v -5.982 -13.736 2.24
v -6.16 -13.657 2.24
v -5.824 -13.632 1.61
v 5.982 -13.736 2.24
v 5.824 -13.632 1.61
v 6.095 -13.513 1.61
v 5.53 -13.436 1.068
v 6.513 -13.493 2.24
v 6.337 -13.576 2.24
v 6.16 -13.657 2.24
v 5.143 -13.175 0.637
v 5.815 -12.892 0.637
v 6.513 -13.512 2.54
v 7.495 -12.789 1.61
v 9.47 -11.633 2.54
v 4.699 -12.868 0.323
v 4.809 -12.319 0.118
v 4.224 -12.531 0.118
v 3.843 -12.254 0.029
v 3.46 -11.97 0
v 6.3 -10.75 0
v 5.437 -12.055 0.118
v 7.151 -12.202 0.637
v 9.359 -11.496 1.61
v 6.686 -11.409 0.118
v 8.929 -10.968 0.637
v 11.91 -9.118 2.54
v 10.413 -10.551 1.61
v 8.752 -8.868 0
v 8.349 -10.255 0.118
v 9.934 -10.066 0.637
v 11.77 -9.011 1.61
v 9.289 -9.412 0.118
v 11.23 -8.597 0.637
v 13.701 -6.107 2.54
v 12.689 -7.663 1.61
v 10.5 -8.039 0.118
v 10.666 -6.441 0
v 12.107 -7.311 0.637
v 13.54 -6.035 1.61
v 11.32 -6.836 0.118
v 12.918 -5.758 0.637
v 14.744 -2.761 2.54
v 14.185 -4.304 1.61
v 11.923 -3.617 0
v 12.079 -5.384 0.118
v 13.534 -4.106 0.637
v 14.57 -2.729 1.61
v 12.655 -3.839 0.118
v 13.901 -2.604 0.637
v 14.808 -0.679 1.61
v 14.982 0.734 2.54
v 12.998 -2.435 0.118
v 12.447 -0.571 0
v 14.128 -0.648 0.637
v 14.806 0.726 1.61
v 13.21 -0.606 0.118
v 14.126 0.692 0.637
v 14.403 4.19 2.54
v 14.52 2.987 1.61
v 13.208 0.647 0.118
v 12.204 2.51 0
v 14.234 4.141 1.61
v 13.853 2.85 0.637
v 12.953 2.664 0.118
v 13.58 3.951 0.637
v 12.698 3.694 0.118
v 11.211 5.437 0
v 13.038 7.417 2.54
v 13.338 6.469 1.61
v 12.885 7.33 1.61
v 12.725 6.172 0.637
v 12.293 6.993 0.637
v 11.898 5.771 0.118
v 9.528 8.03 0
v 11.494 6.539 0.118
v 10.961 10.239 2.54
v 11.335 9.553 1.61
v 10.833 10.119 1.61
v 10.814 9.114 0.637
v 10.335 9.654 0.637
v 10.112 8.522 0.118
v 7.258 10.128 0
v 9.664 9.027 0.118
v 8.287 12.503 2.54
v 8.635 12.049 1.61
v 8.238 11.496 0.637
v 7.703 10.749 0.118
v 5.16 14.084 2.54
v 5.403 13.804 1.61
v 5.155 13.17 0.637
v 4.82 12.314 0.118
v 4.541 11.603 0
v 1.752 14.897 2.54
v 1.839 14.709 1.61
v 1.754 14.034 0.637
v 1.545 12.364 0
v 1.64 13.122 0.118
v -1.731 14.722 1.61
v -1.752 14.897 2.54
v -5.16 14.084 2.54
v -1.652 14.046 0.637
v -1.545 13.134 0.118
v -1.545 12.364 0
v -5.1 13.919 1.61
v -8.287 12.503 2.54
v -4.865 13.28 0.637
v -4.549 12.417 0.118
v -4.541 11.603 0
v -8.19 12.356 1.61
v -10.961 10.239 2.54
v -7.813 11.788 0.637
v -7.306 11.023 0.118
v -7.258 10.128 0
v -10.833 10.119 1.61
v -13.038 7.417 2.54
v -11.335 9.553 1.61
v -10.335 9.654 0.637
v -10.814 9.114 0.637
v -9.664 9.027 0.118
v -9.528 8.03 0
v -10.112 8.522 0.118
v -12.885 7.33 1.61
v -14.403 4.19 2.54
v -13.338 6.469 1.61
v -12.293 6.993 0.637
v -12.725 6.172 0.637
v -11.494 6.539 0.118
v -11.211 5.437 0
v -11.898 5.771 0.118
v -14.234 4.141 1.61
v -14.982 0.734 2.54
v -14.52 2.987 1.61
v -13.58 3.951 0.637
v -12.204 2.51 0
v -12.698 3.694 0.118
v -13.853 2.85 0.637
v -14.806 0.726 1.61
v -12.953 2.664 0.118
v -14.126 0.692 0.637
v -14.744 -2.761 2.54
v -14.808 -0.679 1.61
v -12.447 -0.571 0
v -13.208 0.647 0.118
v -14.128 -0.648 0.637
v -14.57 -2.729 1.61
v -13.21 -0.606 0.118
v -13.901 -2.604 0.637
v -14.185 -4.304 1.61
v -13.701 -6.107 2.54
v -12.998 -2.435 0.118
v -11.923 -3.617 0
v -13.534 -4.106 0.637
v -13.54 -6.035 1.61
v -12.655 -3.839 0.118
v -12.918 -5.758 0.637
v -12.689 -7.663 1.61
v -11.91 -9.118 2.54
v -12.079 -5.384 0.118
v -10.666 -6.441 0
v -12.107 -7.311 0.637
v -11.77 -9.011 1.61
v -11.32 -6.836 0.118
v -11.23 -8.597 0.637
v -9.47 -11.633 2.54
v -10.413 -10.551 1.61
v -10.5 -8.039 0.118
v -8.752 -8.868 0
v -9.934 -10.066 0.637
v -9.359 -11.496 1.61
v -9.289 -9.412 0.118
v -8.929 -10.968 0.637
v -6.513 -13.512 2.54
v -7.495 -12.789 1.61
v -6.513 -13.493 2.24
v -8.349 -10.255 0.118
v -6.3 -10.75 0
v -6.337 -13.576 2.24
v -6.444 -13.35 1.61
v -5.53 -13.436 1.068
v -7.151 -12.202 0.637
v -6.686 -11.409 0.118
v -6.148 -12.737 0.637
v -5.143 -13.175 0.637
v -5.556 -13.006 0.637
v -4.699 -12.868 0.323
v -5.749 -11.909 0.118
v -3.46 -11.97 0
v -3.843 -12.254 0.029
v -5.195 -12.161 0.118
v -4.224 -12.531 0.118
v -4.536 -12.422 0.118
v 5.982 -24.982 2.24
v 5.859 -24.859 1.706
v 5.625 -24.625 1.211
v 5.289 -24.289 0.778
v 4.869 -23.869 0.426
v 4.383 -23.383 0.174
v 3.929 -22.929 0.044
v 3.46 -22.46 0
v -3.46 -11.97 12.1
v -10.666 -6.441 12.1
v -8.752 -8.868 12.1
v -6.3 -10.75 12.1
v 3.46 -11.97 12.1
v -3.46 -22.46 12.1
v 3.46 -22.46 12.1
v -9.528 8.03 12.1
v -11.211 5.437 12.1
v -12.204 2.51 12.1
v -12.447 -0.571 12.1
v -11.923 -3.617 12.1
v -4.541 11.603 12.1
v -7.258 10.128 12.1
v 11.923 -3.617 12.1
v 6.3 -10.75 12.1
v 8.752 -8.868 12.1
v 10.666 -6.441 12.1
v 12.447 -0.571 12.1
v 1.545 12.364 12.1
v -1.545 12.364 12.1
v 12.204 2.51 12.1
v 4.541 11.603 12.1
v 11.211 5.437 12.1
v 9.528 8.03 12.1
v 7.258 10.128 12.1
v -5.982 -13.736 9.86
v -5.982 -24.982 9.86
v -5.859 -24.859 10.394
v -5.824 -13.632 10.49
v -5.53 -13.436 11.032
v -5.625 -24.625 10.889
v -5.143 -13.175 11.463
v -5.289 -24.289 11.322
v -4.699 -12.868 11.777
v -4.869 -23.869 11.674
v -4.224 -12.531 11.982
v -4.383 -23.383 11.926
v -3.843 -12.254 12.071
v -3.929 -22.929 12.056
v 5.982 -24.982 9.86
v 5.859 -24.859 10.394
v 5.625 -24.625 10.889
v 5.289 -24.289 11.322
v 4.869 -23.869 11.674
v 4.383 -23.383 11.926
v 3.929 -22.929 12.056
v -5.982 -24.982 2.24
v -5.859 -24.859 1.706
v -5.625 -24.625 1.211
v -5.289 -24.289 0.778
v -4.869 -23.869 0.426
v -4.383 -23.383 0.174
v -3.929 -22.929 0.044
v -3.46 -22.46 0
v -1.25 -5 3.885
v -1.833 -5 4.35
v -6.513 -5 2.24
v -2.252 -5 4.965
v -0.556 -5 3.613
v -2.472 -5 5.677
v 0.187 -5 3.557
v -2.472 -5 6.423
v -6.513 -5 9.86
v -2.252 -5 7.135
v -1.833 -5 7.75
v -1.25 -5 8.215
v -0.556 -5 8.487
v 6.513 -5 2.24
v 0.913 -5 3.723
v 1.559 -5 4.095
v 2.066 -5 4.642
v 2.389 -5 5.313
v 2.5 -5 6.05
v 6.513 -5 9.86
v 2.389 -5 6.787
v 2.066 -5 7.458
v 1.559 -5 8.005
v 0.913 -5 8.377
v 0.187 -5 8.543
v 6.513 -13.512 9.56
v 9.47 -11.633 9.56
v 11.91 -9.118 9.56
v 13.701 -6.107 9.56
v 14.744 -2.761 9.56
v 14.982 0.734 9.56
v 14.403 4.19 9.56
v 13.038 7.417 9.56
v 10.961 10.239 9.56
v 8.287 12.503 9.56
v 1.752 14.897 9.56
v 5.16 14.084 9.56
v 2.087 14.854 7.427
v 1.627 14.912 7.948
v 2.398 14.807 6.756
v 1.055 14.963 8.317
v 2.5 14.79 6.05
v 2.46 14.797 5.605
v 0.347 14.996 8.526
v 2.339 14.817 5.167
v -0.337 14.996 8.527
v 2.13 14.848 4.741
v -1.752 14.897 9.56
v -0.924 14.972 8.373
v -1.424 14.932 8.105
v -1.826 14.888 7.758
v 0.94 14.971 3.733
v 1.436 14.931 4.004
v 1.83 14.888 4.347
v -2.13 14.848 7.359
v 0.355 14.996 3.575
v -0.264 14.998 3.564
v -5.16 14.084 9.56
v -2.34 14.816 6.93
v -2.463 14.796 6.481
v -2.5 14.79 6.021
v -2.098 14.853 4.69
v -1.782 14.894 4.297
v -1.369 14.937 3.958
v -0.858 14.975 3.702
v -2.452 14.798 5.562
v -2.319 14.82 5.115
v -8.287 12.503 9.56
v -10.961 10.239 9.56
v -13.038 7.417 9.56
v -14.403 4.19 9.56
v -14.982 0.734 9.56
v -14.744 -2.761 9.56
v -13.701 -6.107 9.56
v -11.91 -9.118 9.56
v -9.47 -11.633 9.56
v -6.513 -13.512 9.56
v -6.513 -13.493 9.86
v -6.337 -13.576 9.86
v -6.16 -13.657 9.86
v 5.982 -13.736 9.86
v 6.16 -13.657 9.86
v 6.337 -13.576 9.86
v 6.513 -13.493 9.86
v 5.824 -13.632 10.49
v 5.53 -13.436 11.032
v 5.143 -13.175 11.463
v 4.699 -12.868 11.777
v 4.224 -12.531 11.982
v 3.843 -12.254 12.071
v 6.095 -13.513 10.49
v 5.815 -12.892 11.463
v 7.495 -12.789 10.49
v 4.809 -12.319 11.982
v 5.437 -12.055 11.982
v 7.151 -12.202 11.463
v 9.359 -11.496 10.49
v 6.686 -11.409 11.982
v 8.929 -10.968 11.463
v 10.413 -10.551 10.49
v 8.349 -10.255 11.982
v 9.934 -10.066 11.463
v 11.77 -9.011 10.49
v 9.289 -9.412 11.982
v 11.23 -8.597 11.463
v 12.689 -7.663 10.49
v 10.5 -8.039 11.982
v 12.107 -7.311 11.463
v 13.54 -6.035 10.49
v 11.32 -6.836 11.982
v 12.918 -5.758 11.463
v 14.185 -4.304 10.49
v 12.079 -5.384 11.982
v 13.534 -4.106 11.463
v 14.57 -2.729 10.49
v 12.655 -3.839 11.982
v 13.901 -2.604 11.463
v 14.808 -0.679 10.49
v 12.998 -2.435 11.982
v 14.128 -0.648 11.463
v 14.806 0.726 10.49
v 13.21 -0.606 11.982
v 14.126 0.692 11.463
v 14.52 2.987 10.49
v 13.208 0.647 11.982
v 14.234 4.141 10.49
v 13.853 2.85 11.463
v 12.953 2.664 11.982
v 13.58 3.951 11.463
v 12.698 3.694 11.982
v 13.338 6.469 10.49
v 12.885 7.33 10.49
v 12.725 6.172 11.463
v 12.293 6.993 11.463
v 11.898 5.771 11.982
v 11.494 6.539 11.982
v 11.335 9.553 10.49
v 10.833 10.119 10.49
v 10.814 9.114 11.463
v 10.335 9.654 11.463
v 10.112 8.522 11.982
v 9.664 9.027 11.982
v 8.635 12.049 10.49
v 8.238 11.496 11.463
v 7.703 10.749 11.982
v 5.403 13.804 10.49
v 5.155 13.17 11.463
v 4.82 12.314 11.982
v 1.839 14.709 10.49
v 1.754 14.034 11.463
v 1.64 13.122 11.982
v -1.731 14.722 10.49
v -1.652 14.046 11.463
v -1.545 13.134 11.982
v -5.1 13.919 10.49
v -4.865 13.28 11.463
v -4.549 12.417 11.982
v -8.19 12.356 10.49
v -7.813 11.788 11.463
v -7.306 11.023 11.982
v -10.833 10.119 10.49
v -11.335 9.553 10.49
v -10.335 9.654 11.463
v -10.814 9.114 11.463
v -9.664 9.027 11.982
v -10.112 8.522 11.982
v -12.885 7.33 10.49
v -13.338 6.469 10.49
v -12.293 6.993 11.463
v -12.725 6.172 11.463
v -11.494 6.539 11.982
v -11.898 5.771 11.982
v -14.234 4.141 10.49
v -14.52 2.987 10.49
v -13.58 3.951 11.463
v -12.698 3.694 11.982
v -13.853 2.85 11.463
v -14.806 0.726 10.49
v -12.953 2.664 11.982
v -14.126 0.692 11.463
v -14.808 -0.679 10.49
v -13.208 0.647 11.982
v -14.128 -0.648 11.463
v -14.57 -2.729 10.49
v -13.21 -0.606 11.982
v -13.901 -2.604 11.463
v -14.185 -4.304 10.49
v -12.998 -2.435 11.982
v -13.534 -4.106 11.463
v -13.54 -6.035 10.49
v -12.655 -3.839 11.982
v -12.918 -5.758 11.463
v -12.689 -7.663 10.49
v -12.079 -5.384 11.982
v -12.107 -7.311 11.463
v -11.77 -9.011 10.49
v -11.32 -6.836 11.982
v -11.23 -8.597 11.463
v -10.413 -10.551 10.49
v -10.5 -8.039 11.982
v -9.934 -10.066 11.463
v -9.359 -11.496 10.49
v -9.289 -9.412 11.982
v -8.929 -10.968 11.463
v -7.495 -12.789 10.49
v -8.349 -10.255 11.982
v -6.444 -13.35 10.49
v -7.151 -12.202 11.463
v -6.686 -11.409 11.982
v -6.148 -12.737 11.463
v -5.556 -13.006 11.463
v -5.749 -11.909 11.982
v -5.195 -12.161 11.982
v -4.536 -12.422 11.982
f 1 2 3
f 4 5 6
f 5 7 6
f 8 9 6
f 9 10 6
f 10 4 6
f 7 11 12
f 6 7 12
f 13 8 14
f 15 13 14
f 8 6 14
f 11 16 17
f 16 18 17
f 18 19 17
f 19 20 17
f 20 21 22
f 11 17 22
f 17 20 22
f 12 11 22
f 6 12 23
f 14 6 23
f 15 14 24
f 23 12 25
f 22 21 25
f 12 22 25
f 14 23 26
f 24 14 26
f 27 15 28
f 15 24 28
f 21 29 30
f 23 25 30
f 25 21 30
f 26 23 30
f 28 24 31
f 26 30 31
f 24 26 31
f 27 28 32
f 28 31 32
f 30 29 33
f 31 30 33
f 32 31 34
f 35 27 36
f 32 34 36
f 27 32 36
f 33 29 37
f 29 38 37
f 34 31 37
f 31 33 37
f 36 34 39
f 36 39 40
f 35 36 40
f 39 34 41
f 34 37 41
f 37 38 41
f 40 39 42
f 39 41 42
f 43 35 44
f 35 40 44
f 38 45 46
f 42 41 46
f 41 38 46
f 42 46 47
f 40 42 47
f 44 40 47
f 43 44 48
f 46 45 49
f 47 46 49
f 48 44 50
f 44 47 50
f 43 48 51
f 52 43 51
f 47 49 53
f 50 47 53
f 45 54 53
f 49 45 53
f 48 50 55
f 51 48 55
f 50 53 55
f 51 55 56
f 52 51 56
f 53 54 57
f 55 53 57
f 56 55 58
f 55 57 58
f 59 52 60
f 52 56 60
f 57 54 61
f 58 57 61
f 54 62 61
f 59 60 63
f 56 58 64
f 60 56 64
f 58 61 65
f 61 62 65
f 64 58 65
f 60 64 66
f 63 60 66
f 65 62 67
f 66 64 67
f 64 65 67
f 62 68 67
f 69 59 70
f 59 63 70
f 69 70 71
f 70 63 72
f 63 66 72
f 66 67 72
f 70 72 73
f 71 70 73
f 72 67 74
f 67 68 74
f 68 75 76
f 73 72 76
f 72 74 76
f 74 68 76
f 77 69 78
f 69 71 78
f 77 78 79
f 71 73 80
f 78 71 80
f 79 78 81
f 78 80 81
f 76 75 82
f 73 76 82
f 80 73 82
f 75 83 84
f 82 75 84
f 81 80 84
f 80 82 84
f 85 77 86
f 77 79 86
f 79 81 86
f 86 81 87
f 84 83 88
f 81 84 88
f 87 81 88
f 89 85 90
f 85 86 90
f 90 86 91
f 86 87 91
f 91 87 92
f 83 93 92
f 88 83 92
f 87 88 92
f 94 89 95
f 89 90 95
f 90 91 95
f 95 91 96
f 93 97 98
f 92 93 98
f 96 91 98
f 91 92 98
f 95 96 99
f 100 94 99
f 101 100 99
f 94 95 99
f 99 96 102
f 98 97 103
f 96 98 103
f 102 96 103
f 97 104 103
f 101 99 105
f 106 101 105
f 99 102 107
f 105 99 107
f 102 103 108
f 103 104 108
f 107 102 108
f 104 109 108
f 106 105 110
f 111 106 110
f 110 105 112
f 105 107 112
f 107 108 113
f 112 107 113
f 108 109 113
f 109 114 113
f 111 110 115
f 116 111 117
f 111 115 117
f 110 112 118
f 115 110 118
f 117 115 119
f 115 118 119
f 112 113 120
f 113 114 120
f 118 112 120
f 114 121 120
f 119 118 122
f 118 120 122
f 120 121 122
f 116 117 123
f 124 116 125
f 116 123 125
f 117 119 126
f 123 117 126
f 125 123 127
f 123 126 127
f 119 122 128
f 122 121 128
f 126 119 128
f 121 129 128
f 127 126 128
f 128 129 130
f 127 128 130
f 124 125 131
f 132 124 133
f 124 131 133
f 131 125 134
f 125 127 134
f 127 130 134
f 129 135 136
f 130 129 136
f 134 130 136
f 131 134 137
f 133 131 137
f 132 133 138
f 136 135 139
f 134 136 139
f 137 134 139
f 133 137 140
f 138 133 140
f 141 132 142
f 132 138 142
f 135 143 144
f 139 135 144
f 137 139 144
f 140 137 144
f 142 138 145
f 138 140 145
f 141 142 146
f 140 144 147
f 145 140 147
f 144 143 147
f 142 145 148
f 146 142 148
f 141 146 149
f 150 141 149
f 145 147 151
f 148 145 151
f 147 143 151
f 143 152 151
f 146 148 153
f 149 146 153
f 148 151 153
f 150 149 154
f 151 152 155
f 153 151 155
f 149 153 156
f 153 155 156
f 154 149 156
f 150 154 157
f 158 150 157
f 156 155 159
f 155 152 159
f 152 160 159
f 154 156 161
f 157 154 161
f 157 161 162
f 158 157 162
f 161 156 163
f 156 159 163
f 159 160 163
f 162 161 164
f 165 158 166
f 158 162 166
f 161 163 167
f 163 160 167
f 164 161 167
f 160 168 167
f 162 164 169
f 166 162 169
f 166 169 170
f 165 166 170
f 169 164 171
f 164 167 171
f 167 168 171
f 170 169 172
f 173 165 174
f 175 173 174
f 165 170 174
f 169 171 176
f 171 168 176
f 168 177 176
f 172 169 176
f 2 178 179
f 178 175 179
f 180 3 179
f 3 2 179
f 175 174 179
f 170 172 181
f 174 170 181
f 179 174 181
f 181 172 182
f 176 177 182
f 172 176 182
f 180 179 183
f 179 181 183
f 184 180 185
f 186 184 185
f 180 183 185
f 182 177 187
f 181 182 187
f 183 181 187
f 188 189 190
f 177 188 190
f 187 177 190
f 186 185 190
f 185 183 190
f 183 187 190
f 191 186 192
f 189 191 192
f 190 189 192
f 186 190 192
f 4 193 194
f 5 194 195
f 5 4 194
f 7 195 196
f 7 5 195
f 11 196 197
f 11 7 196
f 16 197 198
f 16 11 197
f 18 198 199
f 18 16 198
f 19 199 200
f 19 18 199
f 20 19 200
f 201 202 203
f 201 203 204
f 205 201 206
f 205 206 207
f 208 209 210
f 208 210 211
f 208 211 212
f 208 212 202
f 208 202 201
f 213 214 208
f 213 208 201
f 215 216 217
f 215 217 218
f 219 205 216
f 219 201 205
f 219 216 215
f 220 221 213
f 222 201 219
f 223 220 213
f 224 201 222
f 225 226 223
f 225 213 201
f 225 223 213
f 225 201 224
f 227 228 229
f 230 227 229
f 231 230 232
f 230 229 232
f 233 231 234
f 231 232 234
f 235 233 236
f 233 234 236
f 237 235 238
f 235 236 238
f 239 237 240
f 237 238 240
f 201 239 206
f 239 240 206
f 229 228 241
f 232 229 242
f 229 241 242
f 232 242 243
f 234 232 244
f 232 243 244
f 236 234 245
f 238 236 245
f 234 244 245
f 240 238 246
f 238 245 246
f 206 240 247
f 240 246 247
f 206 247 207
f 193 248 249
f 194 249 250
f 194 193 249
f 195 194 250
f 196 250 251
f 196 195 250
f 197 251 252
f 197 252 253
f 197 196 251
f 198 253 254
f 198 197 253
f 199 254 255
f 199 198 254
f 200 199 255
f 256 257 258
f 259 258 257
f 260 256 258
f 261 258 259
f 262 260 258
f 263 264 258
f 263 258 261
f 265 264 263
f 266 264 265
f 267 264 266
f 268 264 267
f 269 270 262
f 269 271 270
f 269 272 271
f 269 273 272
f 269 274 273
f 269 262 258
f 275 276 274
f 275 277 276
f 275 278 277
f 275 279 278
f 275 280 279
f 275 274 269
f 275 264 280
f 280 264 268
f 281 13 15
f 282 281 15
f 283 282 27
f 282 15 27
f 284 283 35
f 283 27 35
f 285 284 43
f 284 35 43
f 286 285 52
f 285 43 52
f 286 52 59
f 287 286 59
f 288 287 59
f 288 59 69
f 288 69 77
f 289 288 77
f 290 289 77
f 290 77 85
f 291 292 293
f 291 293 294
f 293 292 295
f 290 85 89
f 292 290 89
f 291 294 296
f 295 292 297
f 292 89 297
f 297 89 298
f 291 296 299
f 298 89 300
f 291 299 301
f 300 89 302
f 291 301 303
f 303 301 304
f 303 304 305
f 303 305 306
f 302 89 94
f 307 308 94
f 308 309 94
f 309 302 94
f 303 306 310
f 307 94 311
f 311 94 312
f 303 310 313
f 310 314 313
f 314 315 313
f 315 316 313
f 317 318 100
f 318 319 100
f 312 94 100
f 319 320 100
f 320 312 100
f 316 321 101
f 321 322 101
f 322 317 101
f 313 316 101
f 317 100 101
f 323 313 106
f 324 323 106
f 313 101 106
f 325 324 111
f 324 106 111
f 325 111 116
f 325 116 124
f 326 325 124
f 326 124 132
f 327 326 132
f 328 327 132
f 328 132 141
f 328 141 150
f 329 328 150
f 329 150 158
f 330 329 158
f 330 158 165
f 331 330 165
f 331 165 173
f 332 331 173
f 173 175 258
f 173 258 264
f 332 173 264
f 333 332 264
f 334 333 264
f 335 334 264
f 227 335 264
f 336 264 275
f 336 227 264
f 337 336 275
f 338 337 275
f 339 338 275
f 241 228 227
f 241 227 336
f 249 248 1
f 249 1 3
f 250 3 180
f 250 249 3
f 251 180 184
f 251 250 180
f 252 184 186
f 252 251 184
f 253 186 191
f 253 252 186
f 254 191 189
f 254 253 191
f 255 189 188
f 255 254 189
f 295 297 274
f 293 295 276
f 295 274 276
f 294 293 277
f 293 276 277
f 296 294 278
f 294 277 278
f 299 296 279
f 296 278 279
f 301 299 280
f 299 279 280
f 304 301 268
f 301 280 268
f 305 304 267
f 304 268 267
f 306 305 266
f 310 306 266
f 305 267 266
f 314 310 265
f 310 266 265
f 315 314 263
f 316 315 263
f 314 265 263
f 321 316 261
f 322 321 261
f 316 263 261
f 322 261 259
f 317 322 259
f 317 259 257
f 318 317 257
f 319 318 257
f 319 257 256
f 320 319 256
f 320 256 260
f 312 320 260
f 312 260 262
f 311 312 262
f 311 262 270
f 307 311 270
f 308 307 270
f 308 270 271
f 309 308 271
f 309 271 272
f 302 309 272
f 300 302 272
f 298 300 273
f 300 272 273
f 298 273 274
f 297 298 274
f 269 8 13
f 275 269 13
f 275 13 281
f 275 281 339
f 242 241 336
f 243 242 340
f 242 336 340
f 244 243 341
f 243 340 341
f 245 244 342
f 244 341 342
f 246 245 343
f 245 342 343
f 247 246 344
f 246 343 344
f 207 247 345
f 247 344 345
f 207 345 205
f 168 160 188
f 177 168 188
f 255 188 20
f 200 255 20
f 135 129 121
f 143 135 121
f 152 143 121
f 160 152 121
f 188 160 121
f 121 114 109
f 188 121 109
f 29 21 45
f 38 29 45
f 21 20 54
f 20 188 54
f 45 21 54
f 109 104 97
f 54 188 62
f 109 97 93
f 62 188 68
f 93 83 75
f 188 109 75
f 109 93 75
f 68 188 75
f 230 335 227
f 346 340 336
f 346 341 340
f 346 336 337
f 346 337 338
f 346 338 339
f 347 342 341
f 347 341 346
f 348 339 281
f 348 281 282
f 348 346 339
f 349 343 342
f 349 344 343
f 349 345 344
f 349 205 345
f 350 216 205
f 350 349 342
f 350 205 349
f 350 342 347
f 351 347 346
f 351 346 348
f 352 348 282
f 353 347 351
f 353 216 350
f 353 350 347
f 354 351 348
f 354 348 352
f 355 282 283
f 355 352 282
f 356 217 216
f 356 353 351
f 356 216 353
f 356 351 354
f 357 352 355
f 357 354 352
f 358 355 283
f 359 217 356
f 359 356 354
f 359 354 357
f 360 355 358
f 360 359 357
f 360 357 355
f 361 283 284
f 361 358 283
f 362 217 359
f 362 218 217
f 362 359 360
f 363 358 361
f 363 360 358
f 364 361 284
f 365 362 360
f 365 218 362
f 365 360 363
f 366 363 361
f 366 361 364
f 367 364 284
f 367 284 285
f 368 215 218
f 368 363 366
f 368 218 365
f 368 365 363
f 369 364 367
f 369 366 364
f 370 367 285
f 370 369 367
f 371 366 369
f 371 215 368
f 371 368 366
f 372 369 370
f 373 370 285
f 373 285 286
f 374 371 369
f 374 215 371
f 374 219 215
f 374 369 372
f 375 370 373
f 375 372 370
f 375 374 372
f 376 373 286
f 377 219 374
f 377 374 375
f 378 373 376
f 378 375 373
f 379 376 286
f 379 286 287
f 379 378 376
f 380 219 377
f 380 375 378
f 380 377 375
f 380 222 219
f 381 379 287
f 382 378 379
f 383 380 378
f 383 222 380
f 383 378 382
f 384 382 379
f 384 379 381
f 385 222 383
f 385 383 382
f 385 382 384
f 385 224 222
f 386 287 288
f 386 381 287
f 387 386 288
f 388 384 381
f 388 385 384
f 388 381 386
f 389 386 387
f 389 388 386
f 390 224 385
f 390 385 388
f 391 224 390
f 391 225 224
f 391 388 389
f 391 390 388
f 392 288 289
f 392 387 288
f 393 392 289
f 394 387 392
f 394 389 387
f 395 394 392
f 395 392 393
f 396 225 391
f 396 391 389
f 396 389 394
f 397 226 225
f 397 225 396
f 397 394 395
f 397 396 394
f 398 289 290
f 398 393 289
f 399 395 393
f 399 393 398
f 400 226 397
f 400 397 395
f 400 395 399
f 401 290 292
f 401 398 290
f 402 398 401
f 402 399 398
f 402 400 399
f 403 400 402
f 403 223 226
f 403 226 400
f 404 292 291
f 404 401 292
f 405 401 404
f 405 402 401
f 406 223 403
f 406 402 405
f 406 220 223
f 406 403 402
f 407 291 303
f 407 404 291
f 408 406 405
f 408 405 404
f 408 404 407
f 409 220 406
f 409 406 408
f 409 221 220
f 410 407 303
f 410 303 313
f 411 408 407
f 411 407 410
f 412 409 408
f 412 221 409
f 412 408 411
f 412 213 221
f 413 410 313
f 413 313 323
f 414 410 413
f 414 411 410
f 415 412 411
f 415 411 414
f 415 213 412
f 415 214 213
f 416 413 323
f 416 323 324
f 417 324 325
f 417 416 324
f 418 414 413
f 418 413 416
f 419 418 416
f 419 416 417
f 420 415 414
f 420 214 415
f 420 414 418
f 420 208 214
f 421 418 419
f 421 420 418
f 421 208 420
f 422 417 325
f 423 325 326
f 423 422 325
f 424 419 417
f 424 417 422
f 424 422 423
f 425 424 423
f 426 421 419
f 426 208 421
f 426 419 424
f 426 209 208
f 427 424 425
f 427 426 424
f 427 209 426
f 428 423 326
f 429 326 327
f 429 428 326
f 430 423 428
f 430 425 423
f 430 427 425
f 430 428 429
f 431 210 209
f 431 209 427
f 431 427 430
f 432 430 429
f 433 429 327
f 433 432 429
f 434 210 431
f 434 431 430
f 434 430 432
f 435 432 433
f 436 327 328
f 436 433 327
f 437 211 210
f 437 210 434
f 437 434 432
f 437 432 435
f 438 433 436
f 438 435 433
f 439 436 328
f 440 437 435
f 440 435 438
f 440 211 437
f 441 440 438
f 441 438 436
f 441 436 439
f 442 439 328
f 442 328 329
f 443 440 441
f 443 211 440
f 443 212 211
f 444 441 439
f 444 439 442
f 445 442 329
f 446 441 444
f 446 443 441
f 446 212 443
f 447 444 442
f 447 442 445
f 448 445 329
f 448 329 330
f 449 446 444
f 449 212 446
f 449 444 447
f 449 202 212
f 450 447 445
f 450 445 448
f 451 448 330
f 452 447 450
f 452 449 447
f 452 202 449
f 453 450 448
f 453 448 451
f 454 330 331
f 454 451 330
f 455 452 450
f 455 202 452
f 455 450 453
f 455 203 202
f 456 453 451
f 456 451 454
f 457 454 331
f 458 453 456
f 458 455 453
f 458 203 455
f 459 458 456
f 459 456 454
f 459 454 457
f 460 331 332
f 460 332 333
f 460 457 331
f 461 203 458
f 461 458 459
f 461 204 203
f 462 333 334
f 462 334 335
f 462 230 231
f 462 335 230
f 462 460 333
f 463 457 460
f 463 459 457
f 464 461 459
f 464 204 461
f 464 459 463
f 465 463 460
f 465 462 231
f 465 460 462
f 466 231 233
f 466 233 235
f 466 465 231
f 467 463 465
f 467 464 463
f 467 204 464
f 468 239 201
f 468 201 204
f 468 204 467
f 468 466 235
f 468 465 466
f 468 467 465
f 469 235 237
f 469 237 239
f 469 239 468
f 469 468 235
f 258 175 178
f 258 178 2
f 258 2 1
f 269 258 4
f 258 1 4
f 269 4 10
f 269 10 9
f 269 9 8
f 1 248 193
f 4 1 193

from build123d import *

# Parameters (mm, degrees)
F1_DEPTH = 12.1
F2_R     = 2.53999
F3_W     = 13.0256410256
F3_H     = 7.62
F4_DEPTH = 20
F5_R     = 2.5
F6_DEPTH = 25.4


# Not quite as in the source:
# - a fillet or chamfer is up to 0.001 mm smaller than in the source, because OpenCascade refuses the exact size


with BuildPart() as f1:
    # F0 (on Top) → F1 (new body)
    with BuildSketch(Plane.XY):
        with BuildLine():
            Line((6, -25), (6, -13.7477270849))
            ThreePointArc((6, -13.7477270849), (0, 15), (-6, -13.7477270849))
            Line((-6, -13.7477270849), (-6, -25))
            Line((-6, -25), (0, -25))
            Line((0, -25), (6, -25))
        make_face()
    extrude(amount=F1_DEPTH)

    # F2 (radius 2.54 in the source; OpenCascade refuses exactly that, so slightly less here)
    f2_edges = [f1.edges().sort_by_distance(p)[0] for p in [
        (-6, -19.373864, 12.1),
        (0, -25, 12.1),
        (6, -19.373864, 12.1),
        (0, 15, 12.1),
        (-6, -19.373864, 0),
        (0, -25, 0),
        (6, -19.373864, 0),
        (0, 15, 0),
    ]]
    fillet(f2_edges, radius=F2_R)

    # F3 (on face) → F4 (cut)
    with BuildSketch(Plane.XZ.offset(25)):
        with Locations((0, 6.05)):
            Rectangle(F3_W, F3_H)
    extrude(amount=-F4_DEPTH, mode=Mode.SUBTRACT)

    # F5 (on face) → F6 (cut)
    with BuildSketch(Plane.XZ.offset(5)):
        with Locations((0, 6.05)):
            Circle(F5_R)
    extrude(amount=-F6_DEPTH, mode=Mode.SUBTRACT)


solid = f1.part
